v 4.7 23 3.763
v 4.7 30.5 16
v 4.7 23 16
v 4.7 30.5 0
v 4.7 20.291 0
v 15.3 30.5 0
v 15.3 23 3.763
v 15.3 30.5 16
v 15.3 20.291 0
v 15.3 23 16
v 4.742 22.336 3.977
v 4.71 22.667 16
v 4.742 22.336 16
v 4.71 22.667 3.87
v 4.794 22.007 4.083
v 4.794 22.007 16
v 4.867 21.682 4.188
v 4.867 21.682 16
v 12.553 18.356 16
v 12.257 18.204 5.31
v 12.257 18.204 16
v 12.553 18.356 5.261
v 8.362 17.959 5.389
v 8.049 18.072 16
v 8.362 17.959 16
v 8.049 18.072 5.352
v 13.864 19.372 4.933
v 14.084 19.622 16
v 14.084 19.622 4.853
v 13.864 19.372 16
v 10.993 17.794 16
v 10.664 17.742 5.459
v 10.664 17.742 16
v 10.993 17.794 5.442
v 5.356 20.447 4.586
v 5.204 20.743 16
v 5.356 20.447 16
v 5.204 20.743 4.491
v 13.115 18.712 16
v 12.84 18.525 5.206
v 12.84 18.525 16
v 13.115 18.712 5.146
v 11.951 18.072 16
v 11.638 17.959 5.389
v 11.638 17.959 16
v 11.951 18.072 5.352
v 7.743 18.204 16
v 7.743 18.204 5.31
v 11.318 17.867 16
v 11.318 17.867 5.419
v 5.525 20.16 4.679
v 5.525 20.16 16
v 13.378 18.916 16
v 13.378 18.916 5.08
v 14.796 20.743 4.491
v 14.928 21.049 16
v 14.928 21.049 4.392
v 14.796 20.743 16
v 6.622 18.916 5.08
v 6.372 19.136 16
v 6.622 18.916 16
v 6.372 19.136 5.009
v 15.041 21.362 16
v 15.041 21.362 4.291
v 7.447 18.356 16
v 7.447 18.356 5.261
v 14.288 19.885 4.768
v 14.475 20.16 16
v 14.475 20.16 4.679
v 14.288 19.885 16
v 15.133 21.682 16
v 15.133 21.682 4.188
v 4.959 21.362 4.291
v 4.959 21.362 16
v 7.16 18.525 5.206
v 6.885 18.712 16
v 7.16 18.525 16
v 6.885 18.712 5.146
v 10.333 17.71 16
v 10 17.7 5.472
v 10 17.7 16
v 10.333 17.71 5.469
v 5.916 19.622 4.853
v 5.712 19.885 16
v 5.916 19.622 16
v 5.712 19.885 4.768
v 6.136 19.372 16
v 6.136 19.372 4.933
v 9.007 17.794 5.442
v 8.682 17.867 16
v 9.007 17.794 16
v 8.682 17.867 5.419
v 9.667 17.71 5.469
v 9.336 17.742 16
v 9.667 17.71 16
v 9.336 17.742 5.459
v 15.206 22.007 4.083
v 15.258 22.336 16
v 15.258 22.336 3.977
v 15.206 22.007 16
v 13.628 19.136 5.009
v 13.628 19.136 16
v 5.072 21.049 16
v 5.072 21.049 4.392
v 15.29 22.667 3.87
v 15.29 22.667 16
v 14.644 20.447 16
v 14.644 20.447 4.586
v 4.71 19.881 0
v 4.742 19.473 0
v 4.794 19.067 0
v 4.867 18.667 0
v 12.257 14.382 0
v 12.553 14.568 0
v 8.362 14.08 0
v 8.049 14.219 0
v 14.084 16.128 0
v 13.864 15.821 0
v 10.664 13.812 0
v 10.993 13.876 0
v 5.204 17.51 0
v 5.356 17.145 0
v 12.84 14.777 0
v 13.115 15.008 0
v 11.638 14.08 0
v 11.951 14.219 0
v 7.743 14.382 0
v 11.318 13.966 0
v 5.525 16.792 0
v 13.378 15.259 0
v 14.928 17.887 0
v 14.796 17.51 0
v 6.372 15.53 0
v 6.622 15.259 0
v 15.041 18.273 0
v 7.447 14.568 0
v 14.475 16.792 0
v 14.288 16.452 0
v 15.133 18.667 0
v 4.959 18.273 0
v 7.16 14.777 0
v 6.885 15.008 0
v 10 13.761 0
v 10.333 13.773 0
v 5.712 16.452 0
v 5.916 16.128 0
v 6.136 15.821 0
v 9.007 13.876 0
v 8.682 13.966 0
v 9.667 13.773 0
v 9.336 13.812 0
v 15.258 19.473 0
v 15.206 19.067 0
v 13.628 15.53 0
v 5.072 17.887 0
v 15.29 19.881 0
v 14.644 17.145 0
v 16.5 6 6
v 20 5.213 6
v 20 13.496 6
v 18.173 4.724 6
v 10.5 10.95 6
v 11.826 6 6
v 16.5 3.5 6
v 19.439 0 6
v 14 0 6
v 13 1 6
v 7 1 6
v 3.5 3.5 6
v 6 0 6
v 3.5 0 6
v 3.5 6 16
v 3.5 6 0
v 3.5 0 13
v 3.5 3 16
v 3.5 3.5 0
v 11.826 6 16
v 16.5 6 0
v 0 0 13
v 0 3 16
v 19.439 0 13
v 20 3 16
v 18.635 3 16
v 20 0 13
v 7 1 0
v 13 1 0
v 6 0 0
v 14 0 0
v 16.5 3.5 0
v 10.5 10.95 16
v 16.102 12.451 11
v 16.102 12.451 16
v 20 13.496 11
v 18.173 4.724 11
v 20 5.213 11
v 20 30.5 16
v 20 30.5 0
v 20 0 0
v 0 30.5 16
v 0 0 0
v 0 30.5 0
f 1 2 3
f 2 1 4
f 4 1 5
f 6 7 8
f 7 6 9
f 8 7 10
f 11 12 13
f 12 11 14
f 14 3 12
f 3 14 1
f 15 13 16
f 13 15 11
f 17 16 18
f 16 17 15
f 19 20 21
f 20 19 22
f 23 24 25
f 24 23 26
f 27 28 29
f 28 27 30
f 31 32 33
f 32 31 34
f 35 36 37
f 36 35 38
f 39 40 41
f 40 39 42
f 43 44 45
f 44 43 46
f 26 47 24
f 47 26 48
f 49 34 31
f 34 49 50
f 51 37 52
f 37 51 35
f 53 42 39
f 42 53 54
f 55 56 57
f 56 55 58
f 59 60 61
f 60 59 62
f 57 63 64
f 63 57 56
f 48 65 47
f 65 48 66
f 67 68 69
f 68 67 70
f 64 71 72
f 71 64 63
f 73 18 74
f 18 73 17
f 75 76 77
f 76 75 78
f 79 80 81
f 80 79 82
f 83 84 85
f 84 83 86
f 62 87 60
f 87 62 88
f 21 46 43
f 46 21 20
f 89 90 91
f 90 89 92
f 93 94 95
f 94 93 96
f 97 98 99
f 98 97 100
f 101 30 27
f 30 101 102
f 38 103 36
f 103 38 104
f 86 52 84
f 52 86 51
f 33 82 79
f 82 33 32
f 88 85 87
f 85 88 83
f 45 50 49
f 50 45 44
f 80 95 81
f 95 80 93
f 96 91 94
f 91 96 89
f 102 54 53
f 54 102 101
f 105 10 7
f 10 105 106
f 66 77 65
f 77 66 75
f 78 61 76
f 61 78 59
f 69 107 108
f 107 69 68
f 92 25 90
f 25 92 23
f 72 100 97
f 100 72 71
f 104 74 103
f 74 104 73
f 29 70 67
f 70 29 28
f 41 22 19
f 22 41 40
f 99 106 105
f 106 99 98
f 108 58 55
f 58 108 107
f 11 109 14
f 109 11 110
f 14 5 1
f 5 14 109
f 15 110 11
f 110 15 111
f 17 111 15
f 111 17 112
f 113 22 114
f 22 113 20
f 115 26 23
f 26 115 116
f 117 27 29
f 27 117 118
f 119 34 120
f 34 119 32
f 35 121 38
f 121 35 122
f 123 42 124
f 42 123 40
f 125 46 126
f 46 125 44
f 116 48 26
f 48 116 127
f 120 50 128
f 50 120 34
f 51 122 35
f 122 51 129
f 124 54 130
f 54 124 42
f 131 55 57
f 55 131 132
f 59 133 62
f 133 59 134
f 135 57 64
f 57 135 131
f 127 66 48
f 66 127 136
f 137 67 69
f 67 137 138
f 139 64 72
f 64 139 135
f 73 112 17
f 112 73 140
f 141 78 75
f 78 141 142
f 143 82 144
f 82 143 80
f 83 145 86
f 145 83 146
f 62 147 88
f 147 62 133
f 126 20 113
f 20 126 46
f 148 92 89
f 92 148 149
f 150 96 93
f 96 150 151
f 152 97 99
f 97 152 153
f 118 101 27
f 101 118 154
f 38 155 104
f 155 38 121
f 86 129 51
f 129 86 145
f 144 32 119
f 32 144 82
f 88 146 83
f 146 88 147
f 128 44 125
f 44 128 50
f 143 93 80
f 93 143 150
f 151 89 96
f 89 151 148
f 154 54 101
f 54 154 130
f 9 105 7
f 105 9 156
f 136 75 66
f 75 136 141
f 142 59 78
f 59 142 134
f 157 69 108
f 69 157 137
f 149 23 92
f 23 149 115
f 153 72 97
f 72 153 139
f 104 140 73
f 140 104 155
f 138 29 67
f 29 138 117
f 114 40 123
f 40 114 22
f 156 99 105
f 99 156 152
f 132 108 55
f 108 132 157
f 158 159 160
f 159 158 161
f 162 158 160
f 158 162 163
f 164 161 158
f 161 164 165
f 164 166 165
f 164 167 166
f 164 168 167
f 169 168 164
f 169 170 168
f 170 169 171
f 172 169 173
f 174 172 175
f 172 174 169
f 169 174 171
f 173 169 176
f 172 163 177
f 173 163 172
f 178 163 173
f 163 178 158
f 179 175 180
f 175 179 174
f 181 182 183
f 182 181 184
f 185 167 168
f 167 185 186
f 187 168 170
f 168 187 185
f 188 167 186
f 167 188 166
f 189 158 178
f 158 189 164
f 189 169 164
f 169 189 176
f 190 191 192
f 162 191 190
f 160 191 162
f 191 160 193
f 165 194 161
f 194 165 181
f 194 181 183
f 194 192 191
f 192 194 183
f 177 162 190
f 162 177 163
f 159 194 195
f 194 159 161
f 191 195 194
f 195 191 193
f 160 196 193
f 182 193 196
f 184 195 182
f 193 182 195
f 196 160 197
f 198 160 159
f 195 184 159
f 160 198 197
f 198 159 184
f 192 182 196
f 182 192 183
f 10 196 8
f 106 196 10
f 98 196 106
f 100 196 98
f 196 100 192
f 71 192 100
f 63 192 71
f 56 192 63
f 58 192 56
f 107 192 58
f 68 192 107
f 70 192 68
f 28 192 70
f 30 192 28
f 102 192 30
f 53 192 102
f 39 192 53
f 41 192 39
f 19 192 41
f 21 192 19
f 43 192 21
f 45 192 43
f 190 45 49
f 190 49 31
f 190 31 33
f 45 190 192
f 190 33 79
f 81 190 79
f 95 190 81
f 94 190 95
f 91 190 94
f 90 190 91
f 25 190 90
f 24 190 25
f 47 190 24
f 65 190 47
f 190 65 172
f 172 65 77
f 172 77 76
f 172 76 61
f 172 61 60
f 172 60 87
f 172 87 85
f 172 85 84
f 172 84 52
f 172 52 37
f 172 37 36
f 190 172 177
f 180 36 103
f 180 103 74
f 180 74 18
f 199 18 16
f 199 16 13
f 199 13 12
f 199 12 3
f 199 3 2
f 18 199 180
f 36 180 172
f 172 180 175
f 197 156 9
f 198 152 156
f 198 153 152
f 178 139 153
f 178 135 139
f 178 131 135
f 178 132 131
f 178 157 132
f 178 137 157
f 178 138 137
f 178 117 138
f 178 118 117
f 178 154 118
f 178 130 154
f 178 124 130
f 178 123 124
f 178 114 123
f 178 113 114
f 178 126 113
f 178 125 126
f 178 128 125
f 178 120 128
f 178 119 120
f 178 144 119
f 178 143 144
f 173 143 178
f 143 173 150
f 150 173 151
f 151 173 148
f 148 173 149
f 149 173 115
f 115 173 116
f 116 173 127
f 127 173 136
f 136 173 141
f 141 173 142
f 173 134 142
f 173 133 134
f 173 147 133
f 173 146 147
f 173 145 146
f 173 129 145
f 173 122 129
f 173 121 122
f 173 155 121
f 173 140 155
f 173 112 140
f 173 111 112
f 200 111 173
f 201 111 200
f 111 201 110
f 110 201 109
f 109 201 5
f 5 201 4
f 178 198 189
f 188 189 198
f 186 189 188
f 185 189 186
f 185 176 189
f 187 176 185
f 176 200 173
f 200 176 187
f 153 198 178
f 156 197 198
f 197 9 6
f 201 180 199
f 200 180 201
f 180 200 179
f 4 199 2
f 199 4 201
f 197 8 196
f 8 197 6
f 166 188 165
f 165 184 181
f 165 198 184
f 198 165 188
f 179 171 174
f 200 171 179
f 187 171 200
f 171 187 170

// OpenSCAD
// Created Code_Ycorner_Endstop.stl
// https://github.com/Mecan0/Code
// By J.Rodigo (www.jra.so)
// Licence Creative commons atribution & share alike.

/**************************/
// Parámetros de la pieza  /
/**************************/

// Diámetro del tornillo (10.6)
dPas = 10.6;	

//Características del final de carrera
hEnd = 13.6;	// Altura (13.6)
wEnd = 5.8;		// Anchura (5.8)
dEnd = 10;		// Profundidad (Inc.pins) (10)


// Pieza principal a trabajar
module bloque(){
	cube([20, 30.5, 16]);	
}

// Taladro y redondeo en forma de U (Centrado)
// (d,h,u) = (diámetro,altura,largo de vaciado)
module RedU(d,h,u){ 
		// Taladro vertical
		translate([(d/2)+(u-d)/2, 0, 0])
		cube([u, d, h],center=true);
		// Vaciado en forma de U
		translate([0, 0, -h/2])
		rotate( 90, [0, 0, 1])
		cylinder(h = h, r = d/2, $fn=100);
}

// Vaciado en forma de U para el tornillo
module taladro(){
	// Vaciado en forma de U (Vertical)
	translate([10, 23, 8])
	rotate( 90, [0, 0, 1])
	RedU(dPas,17,8);
	// Vaciado en forma de U (Inclinado)
	translate([10, 25.2, 6.819])
	rotate(-35.75, [1,0,0])
	rotate( 90, [0, 0, 1])
	RedU(dPas,25,8);
}

// Vaciado y chaflán
module vaciochaflan(){
	// Vaciado plano
	translate([3.5, -1, 6])
	cube([13, 7, 11]);
	// Vaciado chaflán
	translate([-1, 0, 13])
	rotate(45, [1,0,0])
	cube([22, 5, 5]);
}

// Tope para la varilla lisa
module tope(){	
	// Tope de soporte de la varilla lisa
	translate([7, -1, -1])
	cube([6, 2, 8]);
	// Chaflán a 45º
	translate([7, 1, -1])
	rotate(225, [0,0,1])
	cube([2, 2, 8]);
	// Chaflán a 45º
	translate([13, 1, -1])
	rotate(225, [0,0,1])
	cube([2, 2, 8]);
	// Vaciado interior del tope
	translate([3.5, 3.5, -1])
	cube([13, 2.5, 8]);
}

// Zócalo para el final de carrera 
module endstop(){
	translate([10.5, 10.95, 16-dEnd])
	rotate(285, [0,0,1])
	union() {
		// Hueco del final de carrera
		cube([hEnd, wEnd, dEnd+1]);
		//Pasa cables
		cube([8, 10, 5]);
	}
}


// Creamos la pieza a partir del bloque y todas sus operaciones
module pieza(){
	// Bloque principal de la pieza
	difference() {
		bloque();
		union() {
			taladro();
			vaciochaflan();
			tope();
			endstop();
		}
	}
}


// Generamos la pieza!!

	pieza();
